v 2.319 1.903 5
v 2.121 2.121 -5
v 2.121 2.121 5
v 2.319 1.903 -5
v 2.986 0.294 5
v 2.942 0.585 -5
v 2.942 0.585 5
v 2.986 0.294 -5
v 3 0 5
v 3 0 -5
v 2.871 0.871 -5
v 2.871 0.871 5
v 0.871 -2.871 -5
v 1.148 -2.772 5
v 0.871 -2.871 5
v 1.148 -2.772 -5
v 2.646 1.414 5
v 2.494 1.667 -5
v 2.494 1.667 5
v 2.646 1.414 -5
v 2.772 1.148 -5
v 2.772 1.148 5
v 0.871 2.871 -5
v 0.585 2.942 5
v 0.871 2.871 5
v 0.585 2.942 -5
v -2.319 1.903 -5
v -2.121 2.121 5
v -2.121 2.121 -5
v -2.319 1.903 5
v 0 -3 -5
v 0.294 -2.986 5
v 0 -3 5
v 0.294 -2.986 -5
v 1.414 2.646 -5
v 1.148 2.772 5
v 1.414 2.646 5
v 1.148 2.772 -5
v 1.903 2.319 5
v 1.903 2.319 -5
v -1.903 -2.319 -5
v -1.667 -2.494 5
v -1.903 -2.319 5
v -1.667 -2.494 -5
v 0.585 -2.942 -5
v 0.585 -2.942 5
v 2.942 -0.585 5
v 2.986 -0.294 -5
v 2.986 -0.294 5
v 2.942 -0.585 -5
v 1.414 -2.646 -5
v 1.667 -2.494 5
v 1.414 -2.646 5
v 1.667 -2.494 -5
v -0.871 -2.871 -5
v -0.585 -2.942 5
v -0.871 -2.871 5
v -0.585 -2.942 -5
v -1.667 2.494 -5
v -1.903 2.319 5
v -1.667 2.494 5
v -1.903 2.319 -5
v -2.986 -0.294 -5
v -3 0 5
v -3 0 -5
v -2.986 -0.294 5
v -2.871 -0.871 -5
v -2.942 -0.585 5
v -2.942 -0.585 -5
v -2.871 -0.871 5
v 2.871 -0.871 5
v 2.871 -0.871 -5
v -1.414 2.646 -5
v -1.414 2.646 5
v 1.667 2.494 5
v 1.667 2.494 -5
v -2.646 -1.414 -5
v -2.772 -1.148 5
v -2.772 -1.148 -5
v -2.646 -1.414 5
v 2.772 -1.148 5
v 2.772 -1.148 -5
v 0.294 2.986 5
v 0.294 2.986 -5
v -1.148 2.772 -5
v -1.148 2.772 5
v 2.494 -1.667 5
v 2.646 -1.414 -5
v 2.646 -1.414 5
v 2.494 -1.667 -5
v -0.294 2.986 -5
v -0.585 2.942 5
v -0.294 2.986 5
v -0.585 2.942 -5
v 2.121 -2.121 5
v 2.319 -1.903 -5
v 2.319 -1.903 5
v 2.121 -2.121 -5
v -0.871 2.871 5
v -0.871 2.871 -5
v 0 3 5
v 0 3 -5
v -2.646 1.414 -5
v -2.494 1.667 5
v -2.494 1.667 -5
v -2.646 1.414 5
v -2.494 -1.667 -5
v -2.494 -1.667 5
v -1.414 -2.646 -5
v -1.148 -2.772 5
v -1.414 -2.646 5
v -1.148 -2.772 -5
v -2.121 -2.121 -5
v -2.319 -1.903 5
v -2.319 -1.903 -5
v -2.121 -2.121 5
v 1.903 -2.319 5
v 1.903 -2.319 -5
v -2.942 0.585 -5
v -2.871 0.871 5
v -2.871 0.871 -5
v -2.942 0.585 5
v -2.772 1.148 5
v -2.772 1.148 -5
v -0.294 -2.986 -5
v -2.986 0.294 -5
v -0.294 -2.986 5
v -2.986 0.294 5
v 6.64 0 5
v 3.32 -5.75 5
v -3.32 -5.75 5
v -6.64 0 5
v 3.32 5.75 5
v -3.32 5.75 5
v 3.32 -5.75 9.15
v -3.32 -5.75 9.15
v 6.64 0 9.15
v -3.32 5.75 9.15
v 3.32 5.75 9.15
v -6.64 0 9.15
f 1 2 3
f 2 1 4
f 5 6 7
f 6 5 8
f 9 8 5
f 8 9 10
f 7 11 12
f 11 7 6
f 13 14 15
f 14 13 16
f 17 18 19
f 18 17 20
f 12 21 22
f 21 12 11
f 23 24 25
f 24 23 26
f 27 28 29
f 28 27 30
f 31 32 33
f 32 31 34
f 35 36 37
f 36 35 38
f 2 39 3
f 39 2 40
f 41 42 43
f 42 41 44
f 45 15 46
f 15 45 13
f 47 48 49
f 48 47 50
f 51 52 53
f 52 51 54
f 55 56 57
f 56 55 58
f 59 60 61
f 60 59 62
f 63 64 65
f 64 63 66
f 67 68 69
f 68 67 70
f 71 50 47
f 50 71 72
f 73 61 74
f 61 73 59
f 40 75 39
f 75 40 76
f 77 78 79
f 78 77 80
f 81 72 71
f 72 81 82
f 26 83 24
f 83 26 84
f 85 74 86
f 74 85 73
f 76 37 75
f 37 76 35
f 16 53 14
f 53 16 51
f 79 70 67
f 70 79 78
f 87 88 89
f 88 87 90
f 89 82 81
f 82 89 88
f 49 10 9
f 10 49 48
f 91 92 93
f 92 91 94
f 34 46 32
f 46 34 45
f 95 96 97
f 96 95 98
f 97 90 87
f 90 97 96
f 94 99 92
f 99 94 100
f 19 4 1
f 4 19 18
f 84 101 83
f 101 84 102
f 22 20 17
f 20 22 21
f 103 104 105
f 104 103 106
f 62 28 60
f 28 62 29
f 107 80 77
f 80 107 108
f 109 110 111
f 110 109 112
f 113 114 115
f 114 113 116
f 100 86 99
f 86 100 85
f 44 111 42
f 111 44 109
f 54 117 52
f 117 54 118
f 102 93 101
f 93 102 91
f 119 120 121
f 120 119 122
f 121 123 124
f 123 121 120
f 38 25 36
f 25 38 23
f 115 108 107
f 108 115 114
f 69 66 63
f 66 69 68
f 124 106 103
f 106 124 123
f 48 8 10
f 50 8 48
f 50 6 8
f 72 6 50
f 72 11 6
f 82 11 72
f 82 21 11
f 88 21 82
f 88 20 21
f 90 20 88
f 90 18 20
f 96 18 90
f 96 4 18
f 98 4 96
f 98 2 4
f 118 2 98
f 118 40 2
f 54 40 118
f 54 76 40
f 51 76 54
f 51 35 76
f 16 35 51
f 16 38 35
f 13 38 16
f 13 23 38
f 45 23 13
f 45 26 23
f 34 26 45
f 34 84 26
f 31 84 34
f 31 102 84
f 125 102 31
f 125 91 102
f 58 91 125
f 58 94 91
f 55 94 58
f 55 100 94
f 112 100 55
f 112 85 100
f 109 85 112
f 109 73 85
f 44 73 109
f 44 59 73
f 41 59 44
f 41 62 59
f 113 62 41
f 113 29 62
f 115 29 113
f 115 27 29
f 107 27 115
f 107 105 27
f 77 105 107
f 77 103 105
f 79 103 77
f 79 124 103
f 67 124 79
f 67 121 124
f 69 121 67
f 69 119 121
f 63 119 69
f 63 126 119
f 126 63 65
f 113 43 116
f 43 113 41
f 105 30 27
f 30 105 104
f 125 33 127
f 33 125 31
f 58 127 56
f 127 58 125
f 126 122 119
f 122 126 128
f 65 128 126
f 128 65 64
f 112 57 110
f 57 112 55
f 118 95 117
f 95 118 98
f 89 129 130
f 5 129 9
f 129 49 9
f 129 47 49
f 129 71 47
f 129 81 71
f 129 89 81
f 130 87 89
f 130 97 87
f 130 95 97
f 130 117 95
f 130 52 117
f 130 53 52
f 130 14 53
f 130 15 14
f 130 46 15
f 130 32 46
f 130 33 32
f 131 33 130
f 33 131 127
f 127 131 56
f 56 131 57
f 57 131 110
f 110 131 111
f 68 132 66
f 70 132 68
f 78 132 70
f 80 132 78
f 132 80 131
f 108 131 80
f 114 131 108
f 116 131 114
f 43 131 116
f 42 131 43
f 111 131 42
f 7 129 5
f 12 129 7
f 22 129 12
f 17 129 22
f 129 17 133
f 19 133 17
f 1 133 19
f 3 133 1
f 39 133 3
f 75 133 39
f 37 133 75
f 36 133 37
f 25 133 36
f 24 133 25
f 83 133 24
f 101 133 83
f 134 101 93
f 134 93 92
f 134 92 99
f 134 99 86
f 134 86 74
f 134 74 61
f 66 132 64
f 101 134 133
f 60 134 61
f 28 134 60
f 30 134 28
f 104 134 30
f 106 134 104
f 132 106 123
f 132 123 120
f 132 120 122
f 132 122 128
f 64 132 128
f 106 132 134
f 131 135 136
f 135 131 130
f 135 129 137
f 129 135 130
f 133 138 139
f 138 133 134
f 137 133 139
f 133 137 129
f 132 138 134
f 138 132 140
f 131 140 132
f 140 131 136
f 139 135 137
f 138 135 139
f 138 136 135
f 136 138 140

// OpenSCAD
$fn=64;

d_shank = 6.0;
len_shank = 10.0;

d_head = 11.5;
h_head = 4.15;

module hex_prism(flat_d, h){
    r = flat_d / sqrt(3);
    cylinder(h=h, r=r, $fn=6);
}

module screw(){
    union(){
        translate([0,0,-len_shank/2])
            cylinder(h=len_shank, d=d_shank, $fn=64);
        translate([0,0,len_shank/2])
            hex_prism(d_head, h_head);
    }
}

screw();
